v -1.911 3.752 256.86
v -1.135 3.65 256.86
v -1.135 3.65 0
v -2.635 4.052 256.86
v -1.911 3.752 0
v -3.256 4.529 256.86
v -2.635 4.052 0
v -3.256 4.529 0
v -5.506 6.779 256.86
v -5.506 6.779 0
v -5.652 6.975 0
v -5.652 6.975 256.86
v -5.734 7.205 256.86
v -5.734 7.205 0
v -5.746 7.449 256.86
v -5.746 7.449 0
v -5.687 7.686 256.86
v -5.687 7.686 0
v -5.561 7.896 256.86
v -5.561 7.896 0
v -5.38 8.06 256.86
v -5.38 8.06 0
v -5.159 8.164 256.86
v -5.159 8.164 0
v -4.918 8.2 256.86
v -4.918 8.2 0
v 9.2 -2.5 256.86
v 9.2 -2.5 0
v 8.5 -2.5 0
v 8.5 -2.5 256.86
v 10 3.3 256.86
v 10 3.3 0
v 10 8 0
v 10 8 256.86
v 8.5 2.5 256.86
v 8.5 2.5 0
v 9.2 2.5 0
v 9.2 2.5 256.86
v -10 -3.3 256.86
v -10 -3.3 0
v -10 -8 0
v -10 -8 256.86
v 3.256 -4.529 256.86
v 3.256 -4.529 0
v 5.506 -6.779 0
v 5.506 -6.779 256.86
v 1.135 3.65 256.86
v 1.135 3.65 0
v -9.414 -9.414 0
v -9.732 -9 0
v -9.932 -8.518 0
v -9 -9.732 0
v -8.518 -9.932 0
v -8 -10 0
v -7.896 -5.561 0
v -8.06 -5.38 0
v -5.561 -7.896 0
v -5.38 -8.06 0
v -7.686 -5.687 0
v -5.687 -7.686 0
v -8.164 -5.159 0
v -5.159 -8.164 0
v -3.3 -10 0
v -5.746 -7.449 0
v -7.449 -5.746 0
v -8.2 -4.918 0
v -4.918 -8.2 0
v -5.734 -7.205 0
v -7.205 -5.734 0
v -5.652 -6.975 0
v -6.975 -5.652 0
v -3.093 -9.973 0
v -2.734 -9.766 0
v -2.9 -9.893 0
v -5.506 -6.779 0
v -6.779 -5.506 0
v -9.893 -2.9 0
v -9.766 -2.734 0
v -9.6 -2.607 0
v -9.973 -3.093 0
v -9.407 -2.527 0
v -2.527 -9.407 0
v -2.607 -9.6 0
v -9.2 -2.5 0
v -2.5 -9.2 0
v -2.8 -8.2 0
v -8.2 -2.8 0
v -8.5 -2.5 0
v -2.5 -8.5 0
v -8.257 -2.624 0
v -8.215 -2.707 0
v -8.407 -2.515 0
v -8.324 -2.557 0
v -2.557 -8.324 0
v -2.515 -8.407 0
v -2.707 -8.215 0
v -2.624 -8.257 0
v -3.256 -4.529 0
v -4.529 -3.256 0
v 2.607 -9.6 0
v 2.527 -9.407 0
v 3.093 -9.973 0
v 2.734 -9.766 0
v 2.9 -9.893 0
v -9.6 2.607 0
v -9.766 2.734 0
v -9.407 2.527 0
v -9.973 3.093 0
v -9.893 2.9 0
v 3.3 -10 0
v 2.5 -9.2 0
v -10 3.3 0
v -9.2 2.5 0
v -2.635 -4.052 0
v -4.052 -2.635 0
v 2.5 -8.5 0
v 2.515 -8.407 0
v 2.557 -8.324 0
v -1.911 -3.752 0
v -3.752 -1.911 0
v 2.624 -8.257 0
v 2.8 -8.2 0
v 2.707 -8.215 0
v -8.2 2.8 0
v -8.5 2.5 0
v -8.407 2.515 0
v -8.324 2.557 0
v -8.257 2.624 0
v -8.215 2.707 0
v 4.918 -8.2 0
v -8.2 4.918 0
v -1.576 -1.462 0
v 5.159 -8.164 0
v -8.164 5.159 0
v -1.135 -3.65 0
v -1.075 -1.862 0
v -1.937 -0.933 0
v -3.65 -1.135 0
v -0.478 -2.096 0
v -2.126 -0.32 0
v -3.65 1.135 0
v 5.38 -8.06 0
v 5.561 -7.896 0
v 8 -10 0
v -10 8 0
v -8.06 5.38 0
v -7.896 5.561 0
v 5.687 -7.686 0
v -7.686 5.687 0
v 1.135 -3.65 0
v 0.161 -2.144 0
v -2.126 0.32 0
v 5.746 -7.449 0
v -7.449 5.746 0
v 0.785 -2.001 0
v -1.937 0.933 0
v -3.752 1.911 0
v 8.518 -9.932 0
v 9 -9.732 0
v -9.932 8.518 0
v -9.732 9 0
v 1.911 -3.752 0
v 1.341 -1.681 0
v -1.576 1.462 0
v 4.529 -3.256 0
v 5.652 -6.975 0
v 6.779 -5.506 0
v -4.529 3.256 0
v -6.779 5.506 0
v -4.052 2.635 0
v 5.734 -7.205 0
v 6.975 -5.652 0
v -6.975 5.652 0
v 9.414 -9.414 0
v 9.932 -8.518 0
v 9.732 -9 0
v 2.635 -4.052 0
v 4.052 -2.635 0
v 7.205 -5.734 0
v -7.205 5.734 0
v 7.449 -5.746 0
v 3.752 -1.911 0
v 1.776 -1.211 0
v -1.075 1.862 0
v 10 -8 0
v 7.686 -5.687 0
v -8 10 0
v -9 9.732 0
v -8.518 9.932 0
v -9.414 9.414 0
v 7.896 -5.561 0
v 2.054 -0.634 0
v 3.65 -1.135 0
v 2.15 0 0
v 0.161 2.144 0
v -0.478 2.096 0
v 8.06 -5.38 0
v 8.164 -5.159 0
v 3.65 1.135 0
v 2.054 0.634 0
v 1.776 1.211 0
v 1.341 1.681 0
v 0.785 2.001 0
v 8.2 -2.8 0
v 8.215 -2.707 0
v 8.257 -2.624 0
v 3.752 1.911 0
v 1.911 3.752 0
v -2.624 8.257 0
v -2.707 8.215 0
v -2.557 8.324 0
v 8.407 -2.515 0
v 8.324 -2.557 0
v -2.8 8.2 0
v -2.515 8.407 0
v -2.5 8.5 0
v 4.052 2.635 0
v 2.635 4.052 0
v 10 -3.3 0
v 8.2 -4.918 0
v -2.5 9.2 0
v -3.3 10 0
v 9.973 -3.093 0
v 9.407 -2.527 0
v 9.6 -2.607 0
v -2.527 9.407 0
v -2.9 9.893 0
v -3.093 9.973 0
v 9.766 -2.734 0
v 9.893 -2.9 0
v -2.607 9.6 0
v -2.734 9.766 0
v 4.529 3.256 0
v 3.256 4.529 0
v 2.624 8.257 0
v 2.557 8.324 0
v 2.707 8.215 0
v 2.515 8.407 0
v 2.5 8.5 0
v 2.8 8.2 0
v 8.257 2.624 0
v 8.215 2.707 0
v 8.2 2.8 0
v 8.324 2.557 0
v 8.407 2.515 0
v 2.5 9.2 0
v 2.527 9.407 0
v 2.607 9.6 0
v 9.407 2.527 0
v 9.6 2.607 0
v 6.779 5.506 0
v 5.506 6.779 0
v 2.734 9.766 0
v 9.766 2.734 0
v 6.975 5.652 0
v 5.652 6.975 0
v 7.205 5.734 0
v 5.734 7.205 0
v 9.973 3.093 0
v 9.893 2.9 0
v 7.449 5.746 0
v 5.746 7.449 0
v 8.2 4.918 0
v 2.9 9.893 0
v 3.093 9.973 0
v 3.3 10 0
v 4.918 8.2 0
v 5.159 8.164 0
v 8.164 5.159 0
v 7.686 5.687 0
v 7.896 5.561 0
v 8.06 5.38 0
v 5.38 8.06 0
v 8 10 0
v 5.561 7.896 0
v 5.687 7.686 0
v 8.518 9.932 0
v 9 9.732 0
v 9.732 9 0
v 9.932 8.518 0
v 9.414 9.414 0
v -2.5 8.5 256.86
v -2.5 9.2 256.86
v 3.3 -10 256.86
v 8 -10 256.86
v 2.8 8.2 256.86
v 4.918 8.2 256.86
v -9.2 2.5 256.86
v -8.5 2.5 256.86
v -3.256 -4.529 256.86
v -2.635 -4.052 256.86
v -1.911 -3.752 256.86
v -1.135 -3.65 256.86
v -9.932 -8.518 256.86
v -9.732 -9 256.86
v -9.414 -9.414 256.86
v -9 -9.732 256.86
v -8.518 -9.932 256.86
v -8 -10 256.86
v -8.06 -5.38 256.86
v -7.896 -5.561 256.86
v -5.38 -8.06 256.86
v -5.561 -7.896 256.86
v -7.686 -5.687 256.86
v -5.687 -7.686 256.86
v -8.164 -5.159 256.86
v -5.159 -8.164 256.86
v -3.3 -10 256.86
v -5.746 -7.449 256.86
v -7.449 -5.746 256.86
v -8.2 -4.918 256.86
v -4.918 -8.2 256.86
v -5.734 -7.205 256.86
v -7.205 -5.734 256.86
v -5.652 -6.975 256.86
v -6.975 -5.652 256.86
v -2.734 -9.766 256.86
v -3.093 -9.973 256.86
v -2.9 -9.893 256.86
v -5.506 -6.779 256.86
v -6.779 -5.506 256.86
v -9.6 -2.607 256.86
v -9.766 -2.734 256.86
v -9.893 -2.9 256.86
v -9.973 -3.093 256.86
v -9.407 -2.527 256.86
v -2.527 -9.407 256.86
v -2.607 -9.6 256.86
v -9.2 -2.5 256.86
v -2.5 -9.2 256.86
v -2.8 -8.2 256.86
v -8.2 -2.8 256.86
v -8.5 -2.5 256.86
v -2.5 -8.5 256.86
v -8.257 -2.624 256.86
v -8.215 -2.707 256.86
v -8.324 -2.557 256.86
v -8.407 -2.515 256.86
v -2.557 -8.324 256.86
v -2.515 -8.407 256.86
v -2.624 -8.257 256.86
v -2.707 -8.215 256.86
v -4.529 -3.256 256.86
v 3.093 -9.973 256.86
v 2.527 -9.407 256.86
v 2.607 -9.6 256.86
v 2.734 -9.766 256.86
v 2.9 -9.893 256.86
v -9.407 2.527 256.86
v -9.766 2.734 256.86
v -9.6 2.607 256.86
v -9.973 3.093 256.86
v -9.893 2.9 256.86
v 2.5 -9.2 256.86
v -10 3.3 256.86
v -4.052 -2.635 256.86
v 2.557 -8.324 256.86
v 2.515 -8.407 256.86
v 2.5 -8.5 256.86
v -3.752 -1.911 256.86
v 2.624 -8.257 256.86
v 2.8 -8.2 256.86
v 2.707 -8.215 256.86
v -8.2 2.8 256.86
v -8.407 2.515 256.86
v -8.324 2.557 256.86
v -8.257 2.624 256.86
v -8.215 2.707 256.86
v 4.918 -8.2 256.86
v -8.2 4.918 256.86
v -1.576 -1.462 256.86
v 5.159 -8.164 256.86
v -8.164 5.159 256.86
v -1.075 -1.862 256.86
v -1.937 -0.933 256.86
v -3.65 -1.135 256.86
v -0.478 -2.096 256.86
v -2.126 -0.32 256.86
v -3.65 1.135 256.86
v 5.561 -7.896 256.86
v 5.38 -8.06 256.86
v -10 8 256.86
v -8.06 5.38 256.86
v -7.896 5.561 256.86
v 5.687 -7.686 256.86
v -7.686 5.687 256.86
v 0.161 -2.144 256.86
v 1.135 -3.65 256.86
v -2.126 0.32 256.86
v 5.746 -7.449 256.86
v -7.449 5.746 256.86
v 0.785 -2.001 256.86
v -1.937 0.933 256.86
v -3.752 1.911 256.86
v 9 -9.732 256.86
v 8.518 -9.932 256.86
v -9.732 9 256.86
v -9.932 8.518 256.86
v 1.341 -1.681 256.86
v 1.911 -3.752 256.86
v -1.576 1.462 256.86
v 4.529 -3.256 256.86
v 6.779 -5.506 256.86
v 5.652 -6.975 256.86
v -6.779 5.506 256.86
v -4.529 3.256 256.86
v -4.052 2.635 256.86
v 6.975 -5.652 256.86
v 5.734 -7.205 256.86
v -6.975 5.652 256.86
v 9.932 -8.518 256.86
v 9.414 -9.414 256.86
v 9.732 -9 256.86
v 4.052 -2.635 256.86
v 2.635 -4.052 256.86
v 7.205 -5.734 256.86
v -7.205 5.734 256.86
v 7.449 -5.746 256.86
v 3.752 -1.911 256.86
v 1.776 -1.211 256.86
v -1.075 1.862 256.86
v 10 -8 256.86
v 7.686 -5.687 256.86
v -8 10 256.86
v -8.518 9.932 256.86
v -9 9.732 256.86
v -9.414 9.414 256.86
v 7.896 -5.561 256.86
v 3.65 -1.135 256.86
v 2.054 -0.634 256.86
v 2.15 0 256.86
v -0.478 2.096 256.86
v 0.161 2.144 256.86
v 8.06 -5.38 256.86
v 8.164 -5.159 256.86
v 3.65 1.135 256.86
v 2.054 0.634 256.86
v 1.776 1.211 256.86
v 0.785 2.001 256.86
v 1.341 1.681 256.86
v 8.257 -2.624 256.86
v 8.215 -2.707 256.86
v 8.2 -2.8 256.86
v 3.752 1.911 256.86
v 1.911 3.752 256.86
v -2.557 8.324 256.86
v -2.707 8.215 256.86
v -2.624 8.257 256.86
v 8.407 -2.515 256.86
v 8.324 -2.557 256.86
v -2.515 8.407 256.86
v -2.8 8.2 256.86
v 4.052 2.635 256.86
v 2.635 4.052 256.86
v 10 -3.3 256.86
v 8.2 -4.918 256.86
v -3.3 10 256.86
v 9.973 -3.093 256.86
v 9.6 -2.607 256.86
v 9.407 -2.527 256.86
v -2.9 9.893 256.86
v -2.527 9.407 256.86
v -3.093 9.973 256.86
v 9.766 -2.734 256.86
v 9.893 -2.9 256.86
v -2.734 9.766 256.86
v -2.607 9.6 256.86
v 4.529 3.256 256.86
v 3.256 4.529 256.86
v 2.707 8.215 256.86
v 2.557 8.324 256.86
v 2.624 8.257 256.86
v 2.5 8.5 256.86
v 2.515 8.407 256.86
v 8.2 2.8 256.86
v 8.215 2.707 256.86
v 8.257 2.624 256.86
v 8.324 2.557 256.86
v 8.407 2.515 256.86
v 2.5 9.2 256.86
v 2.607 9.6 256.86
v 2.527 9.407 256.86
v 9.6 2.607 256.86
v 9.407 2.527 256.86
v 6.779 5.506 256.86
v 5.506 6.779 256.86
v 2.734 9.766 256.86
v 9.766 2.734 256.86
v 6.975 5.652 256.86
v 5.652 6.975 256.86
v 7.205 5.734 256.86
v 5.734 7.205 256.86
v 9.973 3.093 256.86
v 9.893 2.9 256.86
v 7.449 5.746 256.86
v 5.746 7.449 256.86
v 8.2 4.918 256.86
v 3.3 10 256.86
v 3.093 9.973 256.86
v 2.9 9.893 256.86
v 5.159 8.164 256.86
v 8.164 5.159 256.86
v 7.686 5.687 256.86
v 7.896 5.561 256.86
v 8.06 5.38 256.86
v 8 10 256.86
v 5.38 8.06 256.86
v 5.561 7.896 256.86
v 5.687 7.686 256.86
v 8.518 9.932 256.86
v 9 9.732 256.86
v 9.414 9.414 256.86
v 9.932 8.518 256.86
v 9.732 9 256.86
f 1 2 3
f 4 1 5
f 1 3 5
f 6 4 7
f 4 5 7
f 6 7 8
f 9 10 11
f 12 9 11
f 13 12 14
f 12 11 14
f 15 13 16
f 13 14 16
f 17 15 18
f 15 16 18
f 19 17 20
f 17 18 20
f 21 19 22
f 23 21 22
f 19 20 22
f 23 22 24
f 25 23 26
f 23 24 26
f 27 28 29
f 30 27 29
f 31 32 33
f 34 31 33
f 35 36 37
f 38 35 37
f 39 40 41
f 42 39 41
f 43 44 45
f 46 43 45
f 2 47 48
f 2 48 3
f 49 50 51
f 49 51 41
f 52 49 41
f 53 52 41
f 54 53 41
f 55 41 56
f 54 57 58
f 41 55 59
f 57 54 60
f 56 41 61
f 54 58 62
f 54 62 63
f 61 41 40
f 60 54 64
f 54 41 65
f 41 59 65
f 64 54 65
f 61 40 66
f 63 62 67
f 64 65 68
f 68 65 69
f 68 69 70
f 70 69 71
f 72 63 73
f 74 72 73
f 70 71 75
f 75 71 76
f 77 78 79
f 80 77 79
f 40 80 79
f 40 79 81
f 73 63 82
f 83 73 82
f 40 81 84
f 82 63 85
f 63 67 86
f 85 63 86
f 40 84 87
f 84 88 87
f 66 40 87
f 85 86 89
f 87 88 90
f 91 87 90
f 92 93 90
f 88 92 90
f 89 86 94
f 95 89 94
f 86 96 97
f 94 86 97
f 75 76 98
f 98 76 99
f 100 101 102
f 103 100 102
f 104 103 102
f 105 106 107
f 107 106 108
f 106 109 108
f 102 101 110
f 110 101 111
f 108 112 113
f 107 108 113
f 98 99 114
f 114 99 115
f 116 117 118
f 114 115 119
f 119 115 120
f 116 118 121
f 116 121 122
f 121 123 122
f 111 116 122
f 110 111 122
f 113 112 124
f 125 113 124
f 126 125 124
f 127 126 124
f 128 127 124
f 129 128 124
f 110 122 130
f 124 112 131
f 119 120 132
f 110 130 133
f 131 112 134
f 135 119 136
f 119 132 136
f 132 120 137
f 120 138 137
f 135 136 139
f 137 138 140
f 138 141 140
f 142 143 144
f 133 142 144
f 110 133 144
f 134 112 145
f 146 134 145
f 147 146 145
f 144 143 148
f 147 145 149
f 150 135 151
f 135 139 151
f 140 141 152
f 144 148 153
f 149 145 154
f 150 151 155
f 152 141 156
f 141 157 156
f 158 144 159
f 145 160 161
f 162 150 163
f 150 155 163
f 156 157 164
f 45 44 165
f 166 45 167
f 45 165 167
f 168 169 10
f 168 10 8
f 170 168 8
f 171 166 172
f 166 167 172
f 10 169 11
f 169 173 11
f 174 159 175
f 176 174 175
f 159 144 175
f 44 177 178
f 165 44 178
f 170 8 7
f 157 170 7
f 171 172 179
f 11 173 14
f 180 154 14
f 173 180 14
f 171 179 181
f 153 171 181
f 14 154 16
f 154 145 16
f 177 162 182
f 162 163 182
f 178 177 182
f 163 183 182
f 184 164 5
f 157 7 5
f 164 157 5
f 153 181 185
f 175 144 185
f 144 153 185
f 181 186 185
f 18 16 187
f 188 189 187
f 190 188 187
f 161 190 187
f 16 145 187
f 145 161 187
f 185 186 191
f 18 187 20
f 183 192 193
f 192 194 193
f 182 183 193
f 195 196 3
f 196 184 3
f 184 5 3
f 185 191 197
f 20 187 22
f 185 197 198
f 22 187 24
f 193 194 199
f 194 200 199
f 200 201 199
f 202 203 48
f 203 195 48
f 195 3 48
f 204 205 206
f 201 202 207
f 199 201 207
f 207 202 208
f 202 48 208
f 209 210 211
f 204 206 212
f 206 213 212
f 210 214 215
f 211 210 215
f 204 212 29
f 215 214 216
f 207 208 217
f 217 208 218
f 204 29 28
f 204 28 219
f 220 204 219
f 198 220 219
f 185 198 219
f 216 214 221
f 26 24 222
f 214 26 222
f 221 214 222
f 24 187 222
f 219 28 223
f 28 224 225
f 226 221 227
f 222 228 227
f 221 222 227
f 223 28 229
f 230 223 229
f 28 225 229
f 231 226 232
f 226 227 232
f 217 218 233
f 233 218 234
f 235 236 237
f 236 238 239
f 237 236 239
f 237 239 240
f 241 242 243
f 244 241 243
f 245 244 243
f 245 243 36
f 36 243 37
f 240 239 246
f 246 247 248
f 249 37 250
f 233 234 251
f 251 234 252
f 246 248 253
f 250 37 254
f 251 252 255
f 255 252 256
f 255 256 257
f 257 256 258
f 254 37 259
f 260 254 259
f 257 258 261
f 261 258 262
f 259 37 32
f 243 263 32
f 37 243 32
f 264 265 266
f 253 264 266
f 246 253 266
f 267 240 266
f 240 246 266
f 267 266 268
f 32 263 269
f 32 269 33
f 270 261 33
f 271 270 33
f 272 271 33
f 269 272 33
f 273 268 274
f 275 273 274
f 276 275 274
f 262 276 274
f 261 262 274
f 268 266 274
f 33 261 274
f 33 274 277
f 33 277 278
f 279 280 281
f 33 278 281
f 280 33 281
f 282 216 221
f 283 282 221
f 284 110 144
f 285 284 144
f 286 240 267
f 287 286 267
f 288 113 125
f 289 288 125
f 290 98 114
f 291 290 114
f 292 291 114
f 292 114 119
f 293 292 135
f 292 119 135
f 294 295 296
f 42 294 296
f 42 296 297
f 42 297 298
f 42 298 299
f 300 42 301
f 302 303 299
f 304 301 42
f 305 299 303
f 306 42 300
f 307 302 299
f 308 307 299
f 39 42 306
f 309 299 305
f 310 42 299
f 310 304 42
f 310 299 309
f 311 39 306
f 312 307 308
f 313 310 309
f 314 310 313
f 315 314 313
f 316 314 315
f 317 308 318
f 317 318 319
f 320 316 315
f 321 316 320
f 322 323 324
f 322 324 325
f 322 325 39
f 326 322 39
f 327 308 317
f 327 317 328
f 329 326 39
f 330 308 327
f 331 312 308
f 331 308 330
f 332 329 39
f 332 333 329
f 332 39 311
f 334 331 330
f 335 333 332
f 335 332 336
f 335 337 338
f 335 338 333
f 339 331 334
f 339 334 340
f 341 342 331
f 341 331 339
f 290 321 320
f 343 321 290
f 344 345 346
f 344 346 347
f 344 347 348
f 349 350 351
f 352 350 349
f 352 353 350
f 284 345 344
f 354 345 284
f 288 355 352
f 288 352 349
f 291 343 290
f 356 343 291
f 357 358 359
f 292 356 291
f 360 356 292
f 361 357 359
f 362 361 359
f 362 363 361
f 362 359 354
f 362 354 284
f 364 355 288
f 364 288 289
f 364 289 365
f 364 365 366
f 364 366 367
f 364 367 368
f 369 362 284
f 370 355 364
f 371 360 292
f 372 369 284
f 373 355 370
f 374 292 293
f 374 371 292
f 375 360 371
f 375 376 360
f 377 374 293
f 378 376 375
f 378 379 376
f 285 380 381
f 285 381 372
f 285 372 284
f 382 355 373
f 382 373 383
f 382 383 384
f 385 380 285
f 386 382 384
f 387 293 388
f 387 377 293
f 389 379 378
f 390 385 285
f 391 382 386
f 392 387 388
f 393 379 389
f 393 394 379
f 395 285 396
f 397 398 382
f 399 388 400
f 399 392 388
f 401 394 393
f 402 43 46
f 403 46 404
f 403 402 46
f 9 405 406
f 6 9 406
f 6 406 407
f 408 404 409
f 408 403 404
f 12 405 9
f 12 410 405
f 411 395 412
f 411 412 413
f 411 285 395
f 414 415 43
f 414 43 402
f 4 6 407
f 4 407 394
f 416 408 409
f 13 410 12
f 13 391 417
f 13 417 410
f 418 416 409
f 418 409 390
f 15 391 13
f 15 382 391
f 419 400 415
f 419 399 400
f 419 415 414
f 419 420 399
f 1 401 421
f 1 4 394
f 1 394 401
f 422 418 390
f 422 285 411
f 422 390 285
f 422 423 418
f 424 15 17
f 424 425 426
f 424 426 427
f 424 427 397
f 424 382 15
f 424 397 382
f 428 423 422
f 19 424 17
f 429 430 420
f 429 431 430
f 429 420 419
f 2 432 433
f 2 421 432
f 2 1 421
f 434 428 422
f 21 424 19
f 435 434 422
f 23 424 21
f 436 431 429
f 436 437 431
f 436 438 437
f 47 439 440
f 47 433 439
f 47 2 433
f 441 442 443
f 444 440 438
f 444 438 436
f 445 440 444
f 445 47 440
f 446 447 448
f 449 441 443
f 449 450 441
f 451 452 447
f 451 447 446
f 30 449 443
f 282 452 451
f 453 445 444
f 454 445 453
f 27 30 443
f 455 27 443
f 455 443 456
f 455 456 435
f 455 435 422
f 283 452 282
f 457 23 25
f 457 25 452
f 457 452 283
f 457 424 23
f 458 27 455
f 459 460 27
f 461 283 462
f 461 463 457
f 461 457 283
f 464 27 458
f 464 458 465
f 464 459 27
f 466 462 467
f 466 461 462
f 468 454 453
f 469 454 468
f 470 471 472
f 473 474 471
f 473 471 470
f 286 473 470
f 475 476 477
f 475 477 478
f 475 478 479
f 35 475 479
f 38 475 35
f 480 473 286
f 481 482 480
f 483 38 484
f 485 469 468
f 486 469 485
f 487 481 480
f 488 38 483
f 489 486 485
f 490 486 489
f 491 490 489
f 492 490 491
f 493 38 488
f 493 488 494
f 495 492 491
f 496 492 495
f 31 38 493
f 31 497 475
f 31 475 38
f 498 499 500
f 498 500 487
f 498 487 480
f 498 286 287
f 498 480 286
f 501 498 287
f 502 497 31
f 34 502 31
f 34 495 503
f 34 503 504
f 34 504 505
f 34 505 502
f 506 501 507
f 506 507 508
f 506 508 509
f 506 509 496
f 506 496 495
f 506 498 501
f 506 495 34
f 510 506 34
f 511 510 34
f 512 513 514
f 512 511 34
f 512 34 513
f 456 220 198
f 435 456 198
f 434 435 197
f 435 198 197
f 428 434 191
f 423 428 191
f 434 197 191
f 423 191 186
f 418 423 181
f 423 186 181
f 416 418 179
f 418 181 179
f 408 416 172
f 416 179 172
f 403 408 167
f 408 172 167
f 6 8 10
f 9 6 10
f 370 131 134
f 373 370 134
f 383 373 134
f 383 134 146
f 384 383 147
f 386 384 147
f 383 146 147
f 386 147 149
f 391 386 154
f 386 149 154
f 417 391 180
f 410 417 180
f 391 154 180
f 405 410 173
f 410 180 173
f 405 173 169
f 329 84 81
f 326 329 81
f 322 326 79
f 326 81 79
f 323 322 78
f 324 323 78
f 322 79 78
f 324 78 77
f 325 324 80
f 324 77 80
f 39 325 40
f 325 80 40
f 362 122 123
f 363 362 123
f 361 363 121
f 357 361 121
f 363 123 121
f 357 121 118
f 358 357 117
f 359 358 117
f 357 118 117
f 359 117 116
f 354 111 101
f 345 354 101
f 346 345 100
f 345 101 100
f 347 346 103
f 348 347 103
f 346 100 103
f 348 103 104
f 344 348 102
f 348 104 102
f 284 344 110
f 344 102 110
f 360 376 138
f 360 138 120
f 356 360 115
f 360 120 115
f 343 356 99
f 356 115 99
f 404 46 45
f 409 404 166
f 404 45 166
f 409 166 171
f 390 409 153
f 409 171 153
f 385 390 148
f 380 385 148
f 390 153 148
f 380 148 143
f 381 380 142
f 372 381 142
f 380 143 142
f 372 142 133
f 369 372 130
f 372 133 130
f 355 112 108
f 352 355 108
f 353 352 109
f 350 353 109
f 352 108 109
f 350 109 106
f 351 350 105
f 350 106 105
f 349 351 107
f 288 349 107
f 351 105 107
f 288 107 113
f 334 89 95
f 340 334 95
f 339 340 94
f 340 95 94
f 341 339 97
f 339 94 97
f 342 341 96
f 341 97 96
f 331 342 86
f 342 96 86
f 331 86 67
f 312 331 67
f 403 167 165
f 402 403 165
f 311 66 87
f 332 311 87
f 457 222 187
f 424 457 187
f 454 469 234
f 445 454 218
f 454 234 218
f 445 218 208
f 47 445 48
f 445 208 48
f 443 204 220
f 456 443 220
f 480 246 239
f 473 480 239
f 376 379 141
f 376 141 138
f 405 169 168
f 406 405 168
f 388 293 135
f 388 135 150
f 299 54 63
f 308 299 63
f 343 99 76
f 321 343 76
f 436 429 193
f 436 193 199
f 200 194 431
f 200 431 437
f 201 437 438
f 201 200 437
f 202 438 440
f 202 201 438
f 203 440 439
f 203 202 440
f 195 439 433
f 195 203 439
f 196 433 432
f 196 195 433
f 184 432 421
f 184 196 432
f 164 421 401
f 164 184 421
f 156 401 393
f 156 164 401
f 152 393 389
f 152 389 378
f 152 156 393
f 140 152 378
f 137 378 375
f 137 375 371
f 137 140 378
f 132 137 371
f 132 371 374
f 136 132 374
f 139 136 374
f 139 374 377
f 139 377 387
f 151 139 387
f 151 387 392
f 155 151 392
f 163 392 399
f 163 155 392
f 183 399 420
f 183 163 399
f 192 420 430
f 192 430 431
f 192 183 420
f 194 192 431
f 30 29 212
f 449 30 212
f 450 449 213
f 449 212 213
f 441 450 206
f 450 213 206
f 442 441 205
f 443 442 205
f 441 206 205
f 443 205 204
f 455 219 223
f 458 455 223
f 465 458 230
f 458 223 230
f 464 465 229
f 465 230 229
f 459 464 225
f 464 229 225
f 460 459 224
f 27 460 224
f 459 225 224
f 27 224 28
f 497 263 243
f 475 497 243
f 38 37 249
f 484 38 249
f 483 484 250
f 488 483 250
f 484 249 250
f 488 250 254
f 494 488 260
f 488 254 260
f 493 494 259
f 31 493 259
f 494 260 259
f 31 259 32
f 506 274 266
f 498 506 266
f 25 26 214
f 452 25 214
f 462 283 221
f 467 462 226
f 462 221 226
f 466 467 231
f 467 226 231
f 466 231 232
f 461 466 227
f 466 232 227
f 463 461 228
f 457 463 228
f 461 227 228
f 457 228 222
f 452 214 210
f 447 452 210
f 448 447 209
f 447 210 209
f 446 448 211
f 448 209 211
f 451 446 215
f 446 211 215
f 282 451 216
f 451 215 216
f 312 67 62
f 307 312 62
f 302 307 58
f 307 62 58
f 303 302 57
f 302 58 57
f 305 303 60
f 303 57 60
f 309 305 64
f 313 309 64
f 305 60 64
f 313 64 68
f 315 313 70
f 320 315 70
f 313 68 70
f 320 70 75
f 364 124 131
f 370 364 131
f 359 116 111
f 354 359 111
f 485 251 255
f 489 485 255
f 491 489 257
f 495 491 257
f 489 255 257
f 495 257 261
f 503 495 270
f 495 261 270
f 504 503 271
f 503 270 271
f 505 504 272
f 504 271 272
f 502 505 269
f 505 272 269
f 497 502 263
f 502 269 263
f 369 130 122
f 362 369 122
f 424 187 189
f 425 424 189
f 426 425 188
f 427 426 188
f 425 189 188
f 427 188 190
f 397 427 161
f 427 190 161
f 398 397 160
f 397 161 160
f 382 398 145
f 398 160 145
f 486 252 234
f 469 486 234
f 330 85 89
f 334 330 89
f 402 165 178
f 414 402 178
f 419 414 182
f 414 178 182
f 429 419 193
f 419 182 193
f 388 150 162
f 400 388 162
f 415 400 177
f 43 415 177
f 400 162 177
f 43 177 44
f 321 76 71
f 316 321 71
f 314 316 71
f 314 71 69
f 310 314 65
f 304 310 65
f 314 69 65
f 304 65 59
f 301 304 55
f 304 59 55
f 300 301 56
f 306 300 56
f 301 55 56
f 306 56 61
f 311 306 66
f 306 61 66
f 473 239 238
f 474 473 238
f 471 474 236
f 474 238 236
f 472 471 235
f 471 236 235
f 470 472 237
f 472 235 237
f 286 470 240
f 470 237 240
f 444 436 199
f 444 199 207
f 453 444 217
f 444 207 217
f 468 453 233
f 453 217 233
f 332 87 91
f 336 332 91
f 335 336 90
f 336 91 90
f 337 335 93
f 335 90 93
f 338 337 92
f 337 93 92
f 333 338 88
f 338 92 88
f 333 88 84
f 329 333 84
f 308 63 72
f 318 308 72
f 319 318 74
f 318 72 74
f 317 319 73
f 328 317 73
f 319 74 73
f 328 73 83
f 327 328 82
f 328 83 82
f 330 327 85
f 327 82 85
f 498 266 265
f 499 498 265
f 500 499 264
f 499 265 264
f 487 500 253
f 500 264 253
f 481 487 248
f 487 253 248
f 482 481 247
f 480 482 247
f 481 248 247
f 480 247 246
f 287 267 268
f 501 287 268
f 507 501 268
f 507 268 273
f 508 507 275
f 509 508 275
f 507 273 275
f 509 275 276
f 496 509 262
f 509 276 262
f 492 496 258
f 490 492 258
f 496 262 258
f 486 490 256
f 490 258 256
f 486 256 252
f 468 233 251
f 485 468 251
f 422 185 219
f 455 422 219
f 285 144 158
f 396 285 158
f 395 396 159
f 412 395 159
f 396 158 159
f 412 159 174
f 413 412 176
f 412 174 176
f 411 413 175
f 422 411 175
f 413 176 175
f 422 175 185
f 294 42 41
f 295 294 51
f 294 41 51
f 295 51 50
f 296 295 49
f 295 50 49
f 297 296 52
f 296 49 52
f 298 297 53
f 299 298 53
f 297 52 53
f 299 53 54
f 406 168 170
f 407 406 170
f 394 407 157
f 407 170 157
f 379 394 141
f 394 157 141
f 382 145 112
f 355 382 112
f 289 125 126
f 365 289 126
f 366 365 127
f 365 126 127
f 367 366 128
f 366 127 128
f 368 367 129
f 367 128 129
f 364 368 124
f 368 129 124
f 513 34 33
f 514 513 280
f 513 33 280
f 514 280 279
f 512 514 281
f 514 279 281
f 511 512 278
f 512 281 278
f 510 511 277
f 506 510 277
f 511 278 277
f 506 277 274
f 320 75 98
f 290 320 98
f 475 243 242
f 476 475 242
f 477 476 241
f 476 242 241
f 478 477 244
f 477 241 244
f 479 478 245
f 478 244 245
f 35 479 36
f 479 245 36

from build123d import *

# Parameters (mm, degrees)
BOSS_EXTRU_1_DEPTH = 256.86


with BuildPart() as part:
    # Esquisse1 → Boss.-Extru.1 (new body)
    with BuildSketch(Plane.XY):
        with BuildLine():
            Line((-3.255887446, 4.528679645), (-5.506192286, 6.778984485))
            ThreePointArc((-5.506192286, 6.778984485), (-5.686636441, 7.686138511), (-4.917588391, 8.199999989))
            Line((-4.917588391, 8.199999989), (-2.799999991, 8.199999989))
            ThreePointArc((-2.799999991, 8.199999989), (-2.587867957, 8.287867955), (-2.499999991, 8.499999989))
            Line((-2.499999991, 8.499999989), (-2.499999991, 9.199999989))
            ThreePointArc((-2.499999991, 9.199999989), (-2.734314566, 9.765685414), (-3.299999991, 9.999999989))
            Line((-3.299999991, 9.999999989), (-7.999999991, 9.999999989))
            ThreePointArc((-7.999999991, 9.999999989), (-9.414213554, 9.414213552), (-9.999999991, 7.999999989))
            Line((-9.999999991, 7.999999989), (-9.999999991, 3.299999989))
            ThreePointArc((-9.999999991, 3.299999989), (-9.765685416, 2.734314564), (-9.199999991, 2.499999989))
            Line((-9.199999991, 2.499999989), (-8.499999991, 2.499999989))
            ThreePointArc((-8.499999991, 2.499999989), (-8.287867957, 2.587867955), (-8.199999991, 2.799999989))
            Line((-8.199999991, 2.799999989), (-8.199999991, 4.917588389))
            ThreePointArc((-8.199999991, 4.917588389), (-7.686138517, 5.686636433), (-6.778984497, 5.506192279))
            Line((-6.778984497, 5.506192279), (-4.528679657, 3.255887439))
            ThreePointArc((-4.528679657, 3.255887439), (-3.878361403, 2.282617393), (-3.650000001, 1.134567096))
            Line((-3.650000001, 1.134567096), (-3.650000001, -1.134567114))
            ThreePointArc((-3.650000001, -1.134567114), (-3.878361403, -2.282617409), (-4.528679656, -3.255887454))
            Line((-4.528679656, -3.255887454), (-6.778984496, -5.506192294))
            ThreePointArc((-6.778984496, -5.506192294), (-7.686138522, -5.686636449), (-8.2, -4.9175884))
            Line((-8.2, -4.9175884), (-8.2, -2.8))
            ThreePointArc((-8.2, -2.8), (-8.287867966, -2.587867966), (-8.5, -2.5))
            Line((-8.5, -2.5), (-9.2, -2.5))
            ThreePointArc((-9.2, -2.5), (-9.765685425, -2.734314575), (-10, -3.3))
            Line((-10, -3.3), (-10, -8))
            ThreePointArc((-10, -8), (-9.414213562, -9.414213562), (-8, -10))
            Line((-8, -10), (-3.3, -10))
            ThreePointArc((-3.3, -10), (-2.734314575, -9.765685425), (-2.5, -9.2))
            Line((-2.5, -9.2), (-2.5, -8.5))
            ThreePointArc((-2.5, -8.5), (-2.587867966, -8.287867966), (-2.8, -8.2))
            Line((-2.8, -8.2), (-4.9175884, -8.2))
            ThreePointArc((-4.9175884, -8.2), (-5.686636444, -7.686138526), (-5.50619229, -6.778984506))
            Line((-5.50619229, -6.778984506), (-3.25588745, -4.528679666))
            ThreePointArc((-3.25588745, -4.528679666), (-2.282617404, -3.878361412), (-1.134567106, -3.650000009))
            Line((-1.134567106, -3.650000009), (1.134567104, -3.650000009))
            ThreePointArc((1.134567104, -3.650000009), (2.282617399, -3.878361412), (3.255887444, -4.528679664))
            Line((3.255887444, -4.528679664), (5.506192284, -6.778984504))
            ThreePointArc((5.506192284, -6.778984504), (5.686636439, -7.686138531), (4.917588389, -8.200000009))
            Line((4.917588389, -8.200000009), (2.799999989, -8.200000009))
            ThreePointArc((2.799999989, -8.200000009), (2.587867955, -8.287867974), (2.499999989, -8.500000009))
            Line((2.499999989, -8.500000009), (2.499999989, -9.200000009))
            ThreePointArc((2.499999989, -9.200000009), (2.734314564, -9.765685434), (3.299999989, -10.000000009))
            Line((3.299999989, -10.000000009), (7.999999989, -10.000000009))
            ThreePointArc((7.999999989, -10.000000009), (9.414213552, -9.414213571), (9.999999989, -8.000000009))
            Line((9.999999989, -8.000000009), (9.999999989, -3.300000009))
            ThreePointArc((9.999999989, -3.300000009), (9.765685414, -2.734314584), (9.199999989, -2.500000009))
            Line((9.199999989, -2.500000009), (8.499999989, -2.500000009))
            ThreePointArc((8.499999989, -2.500000009), (8.287867955, -2.587867974), (8.199999989, -2.800000009))
            Line((8.199999989, -2.800000009), (8.199999989, -4.917588409))
            ThreePointArc((8.199999989, -4.917588409), (7.686138515, -5.686636452), (6.778984495, -5.506192299))
            Line((6.778984495, -5.506192299), (4.528679655, -3.255887459))
            ThreePointArc((4.528679655, -3.255887459), (3.878361401, -2.282617412), (3.649999999, -1.134567115))
            Line((3.649999999, -1.134567115), (3.649999999, 1.134567095))
            ThreePointArc((3.649999999, 1.134567095), (3.878361401, 2.28261739), (4.528679654, 3.255887435))
            Line((4.528679654, 3.255887435), (6.778984494, 5.506192275))
            ThreePointArc((6.778984494, 5.506192275), (7.68613852, 5.68663643), (8.199999998, 4.917588381))
            Line((8.199999998, 4.917588381), (8.199999998, 2.799999981))
            ThreePointArc((8.199999998, 2.799999981), (8.287867964, 2.587867946), (8.499999998, 2.499999981))
            Line((8.499999998, 2.499999981), (9.199999998, 2.499999981))
            ThreePointArc((9.199999998, 2.499999981), (9.765685423, 2.734314556), (9.999999998, 3.299999981))
            Line((9.999999998, 3.299999981), (9.999999998, 7.999999981))
            ThreePointArc((9.999999998, 7.999999981), (9.41421356, 9.414213543), (7.999999998, 9.999999981))
            Line((7.999999998, 9.999999981), (3.299999998, 9.999999981))
            ThreePointArc((3.299999998, 9.999999981), (2.734314573, 9.765685406), (2.499999998, 9.199999981))
            Line((2.499999998, 9.199999981), (2.499999998, 8.499999981))
            ThreePointArc((2.499999998, 8.499999981), (2.587867964, 8.287867946), (2.799999998, 8.199999981))
            Line((2.799999998, 8.199999981), (4.917588398, 8.199999981))
            ThreePointArc((4.917588398, 8.199999981), (5.686636442, 7.686138507), (5.506192288, 6.778984487))
            Line((5.506192288, 6.778984487), (3.255887448, 4.528679647))
            ThreePointArc((3.255887448, 4.528679647), (2.282617402, 3.878361393), (1.134567104, 3.64999999))
            Line((1.134567104, 3.64999999), (-1.134567106, 3.64999999))
            ThreePointArc((-1.134567106, 3.64999999), (-2.282617401, 3.878361392), (-3.255887446, 4.528679645))
        make_face()
        with BuildLine():
            ThreePointArc((-2.15, 0), (0, -2.15), (2.15, 0))
            ThreePointArc((2.15, 0), (0, 2.15), (-2.15, 0))
        make_face(mode=Mode.SUBTRACT)
    extrude(amount=BOSS_EXTRU_1_DEPTH)


solid = part.part
